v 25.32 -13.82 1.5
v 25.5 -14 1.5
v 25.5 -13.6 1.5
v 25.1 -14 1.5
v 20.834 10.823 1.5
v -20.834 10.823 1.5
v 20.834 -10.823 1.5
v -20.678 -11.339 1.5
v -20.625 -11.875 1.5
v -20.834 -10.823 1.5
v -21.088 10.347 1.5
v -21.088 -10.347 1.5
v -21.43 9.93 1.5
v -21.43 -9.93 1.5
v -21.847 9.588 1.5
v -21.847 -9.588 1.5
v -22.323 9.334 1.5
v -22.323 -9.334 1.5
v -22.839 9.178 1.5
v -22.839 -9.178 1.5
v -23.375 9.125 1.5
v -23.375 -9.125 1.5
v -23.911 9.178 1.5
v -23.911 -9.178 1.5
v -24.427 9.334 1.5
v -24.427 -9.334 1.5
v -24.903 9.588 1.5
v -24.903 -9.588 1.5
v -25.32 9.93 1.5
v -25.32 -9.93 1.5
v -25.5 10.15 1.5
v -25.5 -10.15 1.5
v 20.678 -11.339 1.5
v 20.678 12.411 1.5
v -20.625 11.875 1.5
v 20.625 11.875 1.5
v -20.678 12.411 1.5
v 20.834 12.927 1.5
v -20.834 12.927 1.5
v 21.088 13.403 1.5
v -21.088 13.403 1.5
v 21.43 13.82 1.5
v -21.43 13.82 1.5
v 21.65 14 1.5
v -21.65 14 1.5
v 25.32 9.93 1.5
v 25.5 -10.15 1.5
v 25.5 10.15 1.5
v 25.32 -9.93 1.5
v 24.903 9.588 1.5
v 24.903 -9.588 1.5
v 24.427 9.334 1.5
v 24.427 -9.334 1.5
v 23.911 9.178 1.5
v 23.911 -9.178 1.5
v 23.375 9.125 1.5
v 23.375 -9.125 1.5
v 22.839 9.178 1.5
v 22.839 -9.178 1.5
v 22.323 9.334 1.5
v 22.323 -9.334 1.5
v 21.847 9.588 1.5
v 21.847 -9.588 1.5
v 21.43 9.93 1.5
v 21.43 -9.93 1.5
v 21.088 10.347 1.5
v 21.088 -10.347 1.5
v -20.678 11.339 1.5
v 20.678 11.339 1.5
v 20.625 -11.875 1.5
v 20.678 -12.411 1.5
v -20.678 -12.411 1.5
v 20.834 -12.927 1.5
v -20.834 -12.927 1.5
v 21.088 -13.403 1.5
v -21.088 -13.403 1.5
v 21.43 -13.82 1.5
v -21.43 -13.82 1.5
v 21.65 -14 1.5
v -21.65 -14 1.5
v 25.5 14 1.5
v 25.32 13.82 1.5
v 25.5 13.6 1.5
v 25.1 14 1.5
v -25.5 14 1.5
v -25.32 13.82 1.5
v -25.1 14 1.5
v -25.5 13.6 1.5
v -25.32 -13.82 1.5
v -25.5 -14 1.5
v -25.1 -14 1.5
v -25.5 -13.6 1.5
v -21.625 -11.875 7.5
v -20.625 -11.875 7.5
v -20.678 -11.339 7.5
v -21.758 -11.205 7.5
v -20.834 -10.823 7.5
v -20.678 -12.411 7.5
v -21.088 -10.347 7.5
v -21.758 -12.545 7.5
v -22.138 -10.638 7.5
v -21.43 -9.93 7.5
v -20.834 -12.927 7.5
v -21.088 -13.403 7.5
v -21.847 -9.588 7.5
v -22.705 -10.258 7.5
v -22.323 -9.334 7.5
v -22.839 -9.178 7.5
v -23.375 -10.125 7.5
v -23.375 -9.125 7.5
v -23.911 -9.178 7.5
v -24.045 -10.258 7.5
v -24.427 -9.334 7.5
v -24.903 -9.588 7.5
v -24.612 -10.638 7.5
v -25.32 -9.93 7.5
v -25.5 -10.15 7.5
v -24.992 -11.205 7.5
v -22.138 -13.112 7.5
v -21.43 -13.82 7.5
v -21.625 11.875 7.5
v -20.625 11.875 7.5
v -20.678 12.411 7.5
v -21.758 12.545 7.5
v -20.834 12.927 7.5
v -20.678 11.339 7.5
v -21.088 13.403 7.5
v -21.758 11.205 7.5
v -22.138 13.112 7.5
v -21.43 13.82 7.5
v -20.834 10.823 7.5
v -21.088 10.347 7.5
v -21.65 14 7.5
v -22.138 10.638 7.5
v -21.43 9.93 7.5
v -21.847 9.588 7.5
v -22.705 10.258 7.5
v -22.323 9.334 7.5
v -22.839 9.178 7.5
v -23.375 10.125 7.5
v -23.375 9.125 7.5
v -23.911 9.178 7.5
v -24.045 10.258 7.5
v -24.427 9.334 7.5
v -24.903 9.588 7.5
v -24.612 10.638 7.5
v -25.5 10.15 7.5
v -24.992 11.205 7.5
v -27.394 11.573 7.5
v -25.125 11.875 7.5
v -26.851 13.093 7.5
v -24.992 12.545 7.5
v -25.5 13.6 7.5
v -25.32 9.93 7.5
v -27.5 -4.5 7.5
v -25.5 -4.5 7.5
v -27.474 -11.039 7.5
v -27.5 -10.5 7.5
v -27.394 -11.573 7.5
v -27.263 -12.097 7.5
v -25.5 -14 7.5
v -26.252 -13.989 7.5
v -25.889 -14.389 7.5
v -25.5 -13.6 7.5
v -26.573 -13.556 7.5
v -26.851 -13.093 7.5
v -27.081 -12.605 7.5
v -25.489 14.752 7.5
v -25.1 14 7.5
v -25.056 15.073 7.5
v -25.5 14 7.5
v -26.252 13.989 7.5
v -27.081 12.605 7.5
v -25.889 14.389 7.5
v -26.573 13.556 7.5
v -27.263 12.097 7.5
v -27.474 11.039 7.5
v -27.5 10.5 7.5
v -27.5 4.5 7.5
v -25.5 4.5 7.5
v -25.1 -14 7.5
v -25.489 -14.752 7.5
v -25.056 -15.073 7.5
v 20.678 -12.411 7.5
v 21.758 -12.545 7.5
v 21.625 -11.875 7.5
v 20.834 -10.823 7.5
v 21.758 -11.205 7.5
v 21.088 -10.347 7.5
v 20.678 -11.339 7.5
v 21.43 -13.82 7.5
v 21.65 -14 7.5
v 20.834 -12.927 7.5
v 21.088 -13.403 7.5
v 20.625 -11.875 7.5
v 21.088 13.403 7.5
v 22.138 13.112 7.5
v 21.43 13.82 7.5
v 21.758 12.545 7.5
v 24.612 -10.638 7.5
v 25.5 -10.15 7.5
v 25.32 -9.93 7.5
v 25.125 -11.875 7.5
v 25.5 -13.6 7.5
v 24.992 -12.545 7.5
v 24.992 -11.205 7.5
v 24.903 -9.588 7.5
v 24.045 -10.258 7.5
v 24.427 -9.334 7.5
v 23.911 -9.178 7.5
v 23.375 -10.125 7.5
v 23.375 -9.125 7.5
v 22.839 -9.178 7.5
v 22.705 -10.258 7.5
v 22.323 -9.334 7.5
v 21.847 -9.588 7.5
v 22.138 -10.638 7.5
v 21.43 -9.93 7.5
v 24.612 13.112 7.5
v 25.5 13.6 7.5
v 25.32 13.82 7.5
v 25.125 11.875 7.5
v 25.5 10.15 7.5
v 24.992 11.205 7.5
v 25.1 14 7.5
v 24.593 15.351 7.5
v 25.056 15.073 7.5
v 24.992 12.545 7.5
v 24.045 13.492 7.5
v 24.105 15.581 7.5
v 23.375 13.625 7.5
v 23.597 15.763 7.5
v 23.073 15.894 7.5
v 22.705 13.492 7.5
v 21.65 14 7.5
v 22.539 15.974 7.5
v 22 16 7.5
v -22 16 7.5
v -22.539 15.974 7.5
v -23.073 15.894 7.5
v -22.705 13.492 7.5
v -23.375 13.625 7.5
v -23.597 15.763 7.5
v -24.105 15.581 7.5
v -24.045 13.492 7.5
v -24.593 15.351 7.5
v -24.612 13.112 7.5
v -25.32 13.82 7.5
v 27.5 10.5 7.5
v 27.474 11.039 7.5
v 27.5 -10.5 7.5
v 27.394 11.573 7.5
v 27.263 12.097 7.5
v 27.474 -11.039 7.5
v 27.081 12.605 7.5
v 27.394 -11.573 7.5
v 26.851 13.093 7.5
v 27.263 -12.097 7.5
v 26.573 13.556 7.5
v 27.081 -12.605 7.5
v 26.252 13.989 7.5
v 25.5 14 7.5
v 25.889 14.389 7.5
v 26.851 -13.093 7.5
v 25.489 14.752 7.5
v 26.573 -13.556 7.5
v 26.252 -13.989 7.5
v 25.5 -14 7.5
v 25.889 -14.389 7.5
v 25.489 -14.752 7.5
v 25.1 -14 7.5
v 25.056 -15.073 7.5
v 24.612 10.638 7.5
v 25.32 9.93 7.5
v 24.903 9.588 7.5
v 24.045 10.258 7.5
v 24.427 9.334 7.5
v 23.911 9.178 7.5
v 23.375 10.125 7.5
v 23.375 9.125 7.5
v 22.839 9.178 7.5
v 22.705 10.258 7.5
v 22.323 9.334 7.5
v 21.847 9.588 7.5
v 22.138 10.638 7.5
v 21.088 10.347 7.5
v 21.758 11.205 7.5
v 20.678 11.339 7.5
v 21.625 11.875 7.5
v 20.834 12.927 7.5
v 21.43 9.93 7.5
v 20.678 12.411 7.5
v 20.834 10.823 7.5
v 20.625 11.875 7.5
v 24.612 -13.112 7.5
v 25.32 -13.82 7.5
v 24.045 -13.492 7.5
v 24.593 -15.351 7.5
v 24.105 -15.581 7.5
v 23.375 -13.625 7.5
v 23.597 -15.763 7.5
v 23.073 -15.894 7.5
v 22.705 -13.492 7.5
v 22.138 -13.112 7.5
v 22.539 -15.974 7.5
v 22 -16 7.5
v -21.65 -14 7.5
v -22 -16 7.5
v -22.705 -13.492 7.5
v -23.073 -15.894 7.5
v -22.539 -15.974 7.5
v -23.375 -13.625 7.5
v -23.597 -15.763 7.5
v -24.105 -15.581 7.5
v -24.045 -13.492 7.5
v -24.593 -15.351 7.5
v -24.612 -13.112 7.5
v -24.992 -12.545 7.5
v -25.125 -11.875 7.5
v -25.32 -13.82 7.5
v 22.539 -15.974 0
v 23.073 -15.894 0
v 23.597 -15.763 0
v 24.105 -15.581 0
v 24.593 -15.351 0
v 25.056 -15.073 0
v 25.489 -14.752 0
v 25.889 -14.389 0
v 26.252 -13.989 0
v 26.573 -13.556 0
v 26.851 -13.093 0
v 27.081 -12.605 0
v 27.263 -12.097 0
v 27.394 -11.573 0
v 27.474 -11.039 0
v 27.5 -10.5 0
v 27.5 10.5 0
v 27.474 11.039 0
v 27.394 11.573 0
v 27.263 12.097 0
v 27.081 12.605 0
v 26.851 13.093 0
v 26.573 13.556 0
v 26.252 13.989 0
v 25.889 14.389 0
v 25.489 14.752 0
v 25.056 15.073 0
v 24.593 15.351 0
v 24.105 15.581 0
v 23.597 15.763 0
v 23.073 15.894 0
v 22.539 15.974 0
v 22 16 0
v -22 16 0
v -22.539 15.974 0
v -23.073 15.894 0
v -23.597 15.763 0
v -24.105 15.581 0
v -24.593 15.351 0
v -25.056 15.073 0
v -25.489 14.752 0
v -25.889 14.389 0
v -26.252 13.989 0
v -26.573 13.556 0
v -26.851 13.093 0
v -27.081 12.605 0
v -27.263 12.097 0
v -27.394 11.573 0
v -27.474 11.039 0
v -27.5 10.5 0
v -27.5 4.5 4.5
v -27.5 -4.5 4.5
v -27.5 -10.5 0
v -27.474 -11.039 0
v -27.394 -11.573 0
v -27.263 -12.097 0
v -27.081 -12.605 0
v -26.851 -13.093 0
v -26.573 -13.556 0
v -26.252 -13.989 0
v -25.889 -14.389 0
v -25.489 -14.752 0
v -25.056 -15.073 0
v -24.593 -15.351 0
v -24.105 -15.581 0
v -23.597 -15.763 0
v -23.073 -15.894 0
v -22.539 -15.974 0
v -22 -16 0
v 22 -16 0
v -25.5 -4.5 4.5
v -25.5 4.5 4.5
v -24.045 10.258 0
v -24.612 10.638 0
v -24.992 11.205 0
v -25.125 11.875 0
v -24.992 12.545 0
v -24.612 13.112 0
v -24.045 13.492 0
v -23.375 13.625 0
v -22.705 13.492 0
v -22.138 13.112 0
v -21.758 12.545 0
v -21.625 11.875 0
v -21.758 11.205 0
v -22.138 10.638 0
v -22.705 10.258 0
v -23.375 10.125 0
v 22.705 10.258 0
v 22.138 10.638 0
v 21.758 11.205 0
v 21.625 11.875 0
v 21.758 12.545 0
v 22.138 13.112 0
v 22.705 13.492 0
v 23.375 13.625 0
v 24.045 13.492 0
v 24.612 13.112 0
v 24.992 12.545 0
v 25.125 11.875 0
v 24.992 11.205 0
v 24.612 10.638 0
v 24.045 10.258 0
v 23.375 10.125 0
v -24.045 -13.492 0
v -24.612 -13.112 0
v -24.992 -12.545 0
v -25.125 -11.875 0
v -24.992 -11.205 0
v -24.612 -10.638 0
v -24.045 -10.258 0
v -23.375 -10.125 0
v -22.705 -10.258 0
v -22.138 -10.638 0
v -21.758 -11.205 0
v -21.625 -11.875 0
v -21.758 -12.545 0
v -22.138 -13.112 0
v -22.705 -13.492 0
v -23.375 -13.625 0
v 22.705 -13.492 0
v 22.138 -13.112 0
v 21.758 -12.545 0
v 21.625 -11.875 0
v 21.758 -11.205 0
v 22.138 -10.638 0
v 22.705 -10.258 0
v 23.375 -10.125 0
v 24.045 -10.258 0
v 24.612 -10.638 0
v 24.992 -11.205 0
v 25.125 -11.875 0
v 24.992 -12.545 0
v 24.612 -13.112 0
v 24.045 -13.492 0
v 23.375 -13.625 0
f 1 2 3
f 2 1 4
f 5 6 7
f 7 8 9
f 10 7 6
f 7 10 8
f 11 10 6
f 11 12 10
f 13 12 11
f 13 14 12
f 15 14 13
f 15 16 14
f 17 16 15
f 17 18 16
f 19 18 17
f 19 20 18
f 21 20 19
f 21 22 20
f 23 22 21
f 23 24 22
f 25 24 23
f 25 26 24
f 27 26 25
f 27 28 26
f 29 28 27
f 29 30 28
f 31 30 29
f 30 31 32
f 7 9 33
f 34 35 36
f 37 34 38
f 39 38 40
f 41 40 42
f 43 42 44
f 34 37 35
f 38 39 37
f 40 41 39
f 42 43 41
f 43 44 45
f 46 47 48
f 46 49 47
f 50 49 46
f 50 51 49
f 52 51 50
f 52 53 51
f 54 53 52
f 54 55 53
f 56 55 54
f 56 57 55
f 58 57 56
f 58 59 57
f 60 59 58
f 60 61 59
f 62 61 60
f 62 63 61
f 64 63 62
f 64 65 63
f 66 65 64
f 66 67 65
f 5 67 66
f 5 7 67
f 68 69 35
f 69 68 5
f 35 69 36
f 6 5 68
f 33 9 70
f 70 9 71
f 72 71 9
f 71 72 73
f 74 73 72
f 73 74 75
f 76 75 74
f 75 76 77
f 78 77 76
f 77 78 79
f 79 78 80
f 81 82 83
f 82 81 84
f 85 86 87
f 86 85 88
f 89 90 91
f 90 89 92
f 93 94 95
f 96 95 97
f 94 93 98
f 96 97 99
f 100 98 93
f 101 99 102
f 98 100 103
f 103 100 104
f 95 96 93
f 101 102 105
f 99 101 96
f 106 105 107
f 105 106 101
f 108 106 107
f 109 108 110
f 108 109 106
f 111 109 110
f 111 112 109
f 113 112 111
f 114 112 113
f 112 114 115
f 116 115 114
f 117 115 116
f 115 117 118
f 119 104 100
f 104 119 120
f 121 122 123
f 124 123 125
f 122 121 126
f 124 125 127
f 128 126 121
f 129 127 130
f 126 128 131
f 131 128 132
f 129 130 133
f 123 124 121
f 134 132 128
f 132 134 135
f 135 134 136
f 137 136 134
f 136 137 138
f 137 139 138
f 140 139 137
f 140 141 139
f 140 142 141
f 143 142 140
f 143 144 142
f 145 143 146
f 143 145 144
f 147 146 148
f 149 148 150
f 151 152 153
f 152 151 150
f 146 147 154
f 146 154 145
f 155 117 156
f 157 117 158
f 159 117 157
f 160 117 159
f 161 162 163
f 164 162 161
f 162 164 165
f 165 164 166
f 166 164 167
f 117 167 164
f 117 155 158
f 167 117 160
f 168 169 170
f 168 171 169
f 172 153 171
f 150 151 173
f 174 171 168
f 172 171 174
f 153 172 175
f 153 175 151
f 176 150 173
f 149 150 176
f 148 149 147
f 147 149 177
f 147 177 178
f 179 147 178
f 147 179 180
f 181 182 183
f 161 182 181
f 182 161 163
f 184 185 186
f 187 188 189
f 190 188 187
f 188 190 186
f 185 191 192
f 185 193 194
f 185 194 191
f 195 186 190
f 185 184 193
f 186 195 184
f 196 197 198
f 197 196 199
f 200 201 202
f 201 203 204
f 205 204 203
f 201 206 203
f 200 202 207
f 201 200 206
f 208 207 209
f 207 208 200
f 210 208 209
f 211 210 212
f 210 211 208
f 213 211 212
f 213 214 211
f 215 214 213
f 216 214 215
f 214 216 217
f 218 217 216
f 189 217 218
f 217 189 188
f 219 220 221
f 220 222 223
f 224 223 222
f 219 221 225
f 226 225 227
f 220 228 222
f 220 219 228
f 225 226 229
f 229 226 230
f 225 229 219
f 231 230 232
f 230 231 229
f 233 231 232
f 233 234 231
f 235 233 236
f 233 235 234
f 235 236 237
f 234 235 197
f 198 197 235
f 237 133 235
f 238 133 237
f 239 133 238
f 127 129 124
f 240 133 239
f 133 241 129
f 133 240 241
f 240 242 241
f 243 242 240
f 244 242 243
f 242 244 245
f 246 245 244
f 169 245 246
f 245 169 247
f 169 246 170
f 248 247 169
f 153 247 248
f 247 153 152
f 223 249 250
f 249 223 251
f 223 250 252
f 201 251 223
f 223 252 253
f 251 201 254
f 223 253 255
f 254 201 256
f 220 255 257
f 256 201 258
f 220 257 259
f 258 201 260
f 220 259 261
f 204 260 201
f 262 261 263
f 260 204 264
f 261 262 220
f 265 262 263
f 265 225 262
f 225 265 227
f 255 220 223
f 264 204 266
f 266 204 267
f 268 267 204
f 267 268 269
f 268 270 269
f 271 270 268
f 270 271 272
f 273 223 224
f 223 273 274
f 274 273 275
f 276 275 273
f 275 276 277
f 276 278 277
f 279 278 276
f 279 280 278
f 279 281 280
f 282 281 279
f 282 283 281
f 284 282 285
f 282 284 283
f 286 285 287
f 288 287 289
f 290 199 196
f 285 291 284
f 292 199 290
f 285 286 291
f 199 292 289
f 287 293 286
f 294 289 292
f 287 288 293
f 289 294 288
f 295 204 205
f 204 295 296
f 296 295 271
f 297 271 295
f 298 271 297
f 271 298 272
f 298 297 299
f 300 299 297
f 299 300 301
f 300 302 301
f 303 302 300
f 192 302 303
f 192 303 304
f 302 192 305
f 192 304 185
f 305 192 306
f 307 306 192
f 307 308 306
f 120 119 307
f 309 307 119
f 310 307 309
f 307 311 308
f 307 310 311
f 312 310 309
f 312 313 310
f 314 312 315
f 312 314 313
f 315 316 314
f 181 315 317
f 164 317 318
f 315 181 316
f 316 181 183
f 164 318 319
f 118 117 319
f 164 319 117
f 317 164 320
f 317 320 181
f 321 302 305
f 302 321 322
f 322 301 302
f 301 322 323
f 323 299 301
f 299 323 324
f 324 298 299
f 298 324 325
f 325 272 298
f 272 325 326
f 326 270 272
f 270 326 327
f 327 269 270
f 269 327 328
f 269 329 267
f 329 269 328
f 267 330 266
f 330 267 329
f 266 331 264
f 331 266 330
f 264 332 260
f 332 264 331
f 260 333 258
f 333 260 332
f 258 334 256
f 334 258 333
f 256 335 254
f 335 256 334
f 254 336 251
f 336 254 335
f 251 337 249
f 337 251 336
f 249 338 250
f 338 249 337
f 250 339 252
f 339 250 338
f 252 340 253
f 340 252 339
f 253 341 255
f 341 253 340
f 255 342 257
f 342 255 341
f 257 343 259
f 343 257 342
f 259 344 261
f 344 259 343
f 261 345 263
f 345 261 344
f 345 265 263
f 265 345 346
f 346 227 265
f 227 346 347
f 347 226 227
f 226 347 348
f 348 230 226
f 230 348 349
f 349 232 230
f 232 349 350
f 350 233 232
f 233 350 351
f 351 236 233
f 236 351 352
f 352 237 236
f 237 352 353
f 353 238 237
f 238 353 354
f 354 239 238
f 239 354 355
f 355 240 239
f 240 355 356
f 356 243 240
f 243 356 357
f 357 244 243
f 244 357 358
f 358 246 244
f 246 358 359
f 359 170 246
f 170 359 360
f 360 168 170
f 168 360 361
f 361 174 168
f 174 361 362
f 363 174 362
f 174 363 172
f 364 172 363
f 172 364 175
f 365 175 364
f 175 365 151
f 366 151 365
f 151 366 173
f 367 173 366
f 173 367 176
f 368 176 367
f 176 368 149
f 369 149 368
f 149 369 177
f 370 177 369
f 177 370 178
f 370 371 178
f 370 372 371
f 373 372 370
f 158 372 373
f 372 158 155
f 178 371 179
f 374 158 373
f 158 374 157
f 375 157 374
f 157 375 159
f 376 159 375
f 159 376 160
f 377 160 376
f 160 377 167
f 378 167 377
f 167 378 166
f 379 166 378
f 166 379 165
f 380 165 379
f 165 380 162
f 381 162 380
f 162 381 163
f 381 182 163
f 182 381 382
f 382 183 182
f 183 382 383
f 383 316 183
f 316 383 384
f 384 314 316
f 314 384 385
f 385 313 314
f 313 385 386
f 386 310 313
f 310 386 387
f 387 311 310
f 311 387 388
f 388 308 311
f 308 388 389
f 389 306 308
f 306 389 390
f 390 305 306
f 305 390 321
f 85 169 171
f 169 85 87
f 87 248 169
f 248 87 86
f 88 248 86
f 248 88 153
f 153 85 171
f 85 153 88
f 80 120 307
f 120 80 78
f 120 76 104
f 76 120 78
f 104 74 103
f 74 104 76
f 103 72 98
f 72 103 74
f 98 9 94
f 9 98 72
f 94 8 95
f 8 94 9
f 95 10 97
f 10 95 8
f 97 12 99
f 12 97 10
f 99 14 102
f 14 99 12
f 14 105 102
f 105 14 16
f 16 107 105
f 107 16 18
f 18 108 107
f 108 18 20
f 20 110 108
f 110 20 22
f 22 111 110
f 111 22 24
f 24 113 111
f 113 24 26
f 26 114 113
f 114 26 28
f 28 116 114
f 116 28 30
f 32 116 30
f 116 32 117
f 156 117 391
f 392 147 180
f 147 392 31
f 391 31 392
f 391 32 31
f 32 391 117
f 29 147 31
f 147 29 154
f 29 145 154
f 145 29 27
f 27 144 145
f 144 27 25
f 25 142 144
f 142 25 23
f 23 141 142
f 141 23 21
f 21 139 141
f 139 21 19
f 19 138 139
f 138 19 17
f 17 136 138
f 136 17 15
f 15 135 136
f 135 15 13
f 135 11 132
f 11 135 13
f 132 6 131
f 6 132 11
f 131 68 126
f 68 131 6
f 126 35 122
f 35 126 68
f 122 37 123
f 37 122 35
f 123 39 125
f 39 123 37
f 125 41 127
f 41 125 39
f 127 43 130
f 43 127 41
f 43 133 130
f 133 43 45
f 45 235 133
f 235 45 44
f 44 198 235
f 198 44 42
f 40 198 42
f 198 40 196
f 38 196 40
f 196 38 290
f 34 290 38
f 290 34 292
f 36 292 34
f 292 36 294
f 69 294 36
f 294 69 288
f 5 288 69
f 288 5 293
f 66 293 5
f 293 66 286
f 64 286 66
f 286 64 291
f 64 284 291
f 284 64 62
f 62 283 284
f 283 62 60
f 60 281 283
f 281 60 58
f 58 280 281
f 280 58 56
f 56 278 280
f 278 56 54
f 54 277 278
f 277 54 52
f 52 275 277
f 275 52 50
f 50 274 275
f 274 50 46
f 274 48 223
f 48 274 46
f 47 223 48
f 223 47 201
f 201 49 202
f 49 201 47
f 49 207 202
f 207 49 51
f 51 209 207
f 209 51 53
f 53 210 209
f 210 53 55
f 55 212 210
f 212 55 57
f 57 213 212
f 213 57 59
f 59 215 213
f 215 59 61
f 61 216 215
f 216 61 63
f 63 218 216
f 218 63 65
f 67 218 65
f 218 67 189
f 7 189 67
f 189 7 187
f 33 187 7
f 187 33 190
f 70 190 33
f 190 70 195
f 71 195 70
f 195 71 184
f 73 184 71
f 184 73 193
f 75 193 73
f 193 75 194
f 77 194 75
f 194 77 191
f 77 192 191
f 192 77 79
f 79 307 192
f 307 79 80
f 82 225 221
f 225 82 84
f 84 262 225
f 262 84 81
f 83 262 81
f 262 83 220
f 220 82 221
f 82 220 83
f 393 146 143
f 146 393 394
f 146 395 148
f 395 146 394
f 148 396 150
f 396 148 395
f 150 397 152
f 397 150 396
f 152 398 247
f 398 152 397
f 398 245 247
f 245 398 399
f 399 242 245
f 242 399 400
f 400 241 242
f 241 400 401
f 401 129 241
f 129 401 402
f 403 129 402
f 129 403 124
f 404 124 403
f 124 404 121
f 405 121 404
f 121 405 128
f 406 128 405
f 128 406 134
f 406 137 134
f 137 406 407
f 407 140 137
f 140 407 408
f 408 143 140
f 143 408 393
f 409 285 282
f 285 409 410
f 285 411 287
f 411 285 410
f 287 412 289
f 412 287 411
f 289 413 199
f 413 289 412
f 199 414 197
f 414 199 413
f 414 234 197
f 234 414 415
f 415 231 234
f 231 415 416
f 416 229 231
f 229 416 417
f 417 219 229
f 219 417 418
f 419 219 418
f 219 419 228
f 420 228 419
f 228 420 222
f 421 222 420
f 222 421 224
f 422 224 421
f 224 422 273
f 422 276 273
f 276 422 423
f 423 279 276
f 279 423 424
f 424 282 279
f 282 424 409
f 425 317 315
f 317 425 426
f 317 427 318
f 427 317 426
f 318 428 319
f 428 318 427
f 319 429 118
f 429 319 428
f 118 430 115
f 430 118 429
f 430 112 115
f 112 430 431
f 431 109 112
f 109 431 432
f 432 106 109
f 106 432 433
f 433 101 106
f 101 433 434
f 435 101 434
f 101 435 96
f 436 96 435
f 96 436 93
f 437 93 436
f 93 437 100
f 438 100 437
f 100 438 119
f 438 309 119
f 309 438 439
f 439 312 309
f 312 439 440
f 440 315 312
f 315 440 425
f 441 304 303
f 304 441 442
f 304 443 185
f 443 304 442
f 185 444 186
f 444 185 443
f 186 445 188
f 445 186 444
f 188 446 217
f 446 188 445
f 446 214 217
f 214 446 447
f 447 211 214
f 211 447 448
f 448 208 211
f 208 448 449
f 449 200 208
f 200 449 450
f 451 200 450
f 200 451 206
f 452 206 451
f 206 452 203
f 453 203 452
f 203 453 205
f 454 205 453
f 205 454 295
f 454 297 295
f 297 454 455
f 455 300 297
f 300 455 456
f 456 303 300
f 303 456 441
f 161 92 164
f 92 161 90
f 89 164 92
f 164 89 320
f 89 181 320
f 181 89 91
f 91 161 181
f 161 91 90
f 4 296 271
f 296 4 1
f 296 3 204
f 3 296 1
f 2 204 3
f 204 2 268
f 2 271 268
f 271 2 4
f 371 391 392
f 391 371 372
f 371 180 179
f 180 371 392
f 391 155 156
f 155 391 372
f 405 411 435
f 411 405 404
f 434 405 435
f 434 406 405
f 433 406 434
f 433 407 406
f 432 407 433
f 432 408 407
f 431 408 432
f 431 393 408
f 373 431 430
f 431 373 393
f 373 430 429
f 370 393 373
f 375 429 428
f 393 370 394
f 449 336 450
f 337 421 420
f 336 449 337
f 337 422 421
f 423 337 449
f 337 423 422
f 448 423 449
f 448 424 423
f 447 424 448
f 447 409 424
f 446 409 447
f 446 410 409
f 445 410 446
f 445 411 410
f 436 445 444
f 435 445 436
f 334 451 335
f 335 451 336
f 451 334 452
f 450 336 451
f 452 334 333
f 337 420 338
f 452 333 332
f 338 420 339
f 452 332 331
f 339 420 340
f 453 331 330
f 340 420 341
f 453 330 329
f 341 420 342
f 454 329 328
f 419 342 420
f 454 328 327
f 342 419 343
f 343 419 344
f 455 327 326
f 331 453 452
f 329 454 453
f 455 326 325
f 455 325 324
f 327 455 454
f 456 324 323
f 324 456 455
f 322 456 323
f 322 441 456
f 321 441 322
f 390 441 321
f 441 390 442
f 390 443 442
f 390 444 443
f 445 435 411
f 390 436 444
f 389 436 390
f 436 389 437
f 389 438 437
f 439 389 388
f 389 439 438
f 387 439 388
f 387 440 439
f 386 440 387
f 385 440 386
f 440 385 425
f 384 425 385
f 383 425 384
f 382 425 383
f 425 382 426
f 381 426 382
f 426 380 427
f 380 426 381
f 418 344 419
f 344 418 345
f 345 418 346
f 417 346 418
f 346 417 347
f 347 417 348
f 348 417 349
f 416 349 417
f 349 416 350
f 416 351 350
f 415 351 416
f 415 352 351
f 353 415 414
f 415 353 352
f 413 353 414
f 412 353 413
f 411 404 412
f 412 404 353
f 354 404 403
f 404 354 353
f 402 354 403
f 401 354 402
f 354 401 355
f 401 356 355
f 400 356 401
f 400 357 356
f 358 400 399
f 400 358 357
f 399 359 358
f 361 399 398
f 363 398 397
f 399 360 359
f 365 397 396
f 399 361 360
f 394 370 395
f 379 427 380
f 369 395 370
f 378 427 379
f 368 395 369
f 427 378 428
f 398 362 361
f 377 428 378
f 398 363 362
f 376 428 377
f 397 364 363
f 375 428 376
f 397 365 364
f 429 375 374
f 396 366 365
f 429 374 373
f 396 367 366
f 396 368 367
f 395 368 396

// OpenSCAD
// file: ../dimensions.scad
outer_dimensions = [55, 32];
outer_radius = 5.5;
wall = 2;

mounting_hole_centres = outer_dimensions - (1.5 * [outer_radius, outer_radius]);
hole_support = 5.5;

upper_plate = 1.5;
upper_height = 10;

lower_plate = 1.5;
lower_height = 6;
// file: ../common.scad
module PlaceAtCentres(centres)
{
  dx = centres[0] / 2;
  dy = centres[1] / 2;

  for(x = [-dx, dx])
  {
    for(y = [-dy, dy])
    {
      translate([x, y])
      {
        children();
      }
    }
  }
}

module OuterProjection(size, radius)
{
  centres = size - (2 * [radius, radius]);

  hull()
  {
    PlaceAtCentres(centres)
    {
      circle(r=radius, $fn=64);
    }
  }
}

module MountHoles(centres, support_diameter, hole_diameter, hole_edges)
{
  difference()
  {
    PlaceAtCentres(centres)
    {
      circle(d=support_diameter, $fn=32);
    }

    PlaceAtCentres(centres)
    {
      circle(d=hole_diameter, $fn=hole_edges);
    }
  }
}

module InnerProjection(size, wall_thickness, radius, hole_centres, support_diameter, hole_diameter, hole_edges)
{
  difference()
  {
    OuterProjection(size, radius);
    square(size - (2 * [wall_thickness, wall_thickness]), center=true);
  }
  MountHoles(hole_centres, support_diameter, hole_diameter, hole_edges);
}

module LowerPlate(size, radius, hole_centres, hole_diameter, hole_edges)
{
  difference()
  {
    OuterProjection(size, radius);

    PlaceAtCentres(hole_centres)
    {
      circle(d=hole_diameter, $fn=hole_edges);
    }
  }
}
// main file
use <../common.scad>
include <../dimensions.scad>

module Lower()
{
  translate([0, 0, lower_plate])
  {
    difference()
    {
      color("blue")
      {
        linear_extrude(lower_height)
        {
          InnerProjection(outer_dimensions, wall, outer_radius, mounting_hole_centres, hole_support, 3.5, 16);
        }
      }

      translate([-(outer_dimensions[0] / 2) - 1, -9 / 2, 3])
      {
        cube([wall + 2, 9, 4]);
      }
    }
  }

  color("magenta")
  {
    linear_extrude(lower_plate)
    {
      LowerPlate(outer_dimensions, outer_radius, mounting_hole_centres, 3.5, 16);
    }
  }
}

Lower();
